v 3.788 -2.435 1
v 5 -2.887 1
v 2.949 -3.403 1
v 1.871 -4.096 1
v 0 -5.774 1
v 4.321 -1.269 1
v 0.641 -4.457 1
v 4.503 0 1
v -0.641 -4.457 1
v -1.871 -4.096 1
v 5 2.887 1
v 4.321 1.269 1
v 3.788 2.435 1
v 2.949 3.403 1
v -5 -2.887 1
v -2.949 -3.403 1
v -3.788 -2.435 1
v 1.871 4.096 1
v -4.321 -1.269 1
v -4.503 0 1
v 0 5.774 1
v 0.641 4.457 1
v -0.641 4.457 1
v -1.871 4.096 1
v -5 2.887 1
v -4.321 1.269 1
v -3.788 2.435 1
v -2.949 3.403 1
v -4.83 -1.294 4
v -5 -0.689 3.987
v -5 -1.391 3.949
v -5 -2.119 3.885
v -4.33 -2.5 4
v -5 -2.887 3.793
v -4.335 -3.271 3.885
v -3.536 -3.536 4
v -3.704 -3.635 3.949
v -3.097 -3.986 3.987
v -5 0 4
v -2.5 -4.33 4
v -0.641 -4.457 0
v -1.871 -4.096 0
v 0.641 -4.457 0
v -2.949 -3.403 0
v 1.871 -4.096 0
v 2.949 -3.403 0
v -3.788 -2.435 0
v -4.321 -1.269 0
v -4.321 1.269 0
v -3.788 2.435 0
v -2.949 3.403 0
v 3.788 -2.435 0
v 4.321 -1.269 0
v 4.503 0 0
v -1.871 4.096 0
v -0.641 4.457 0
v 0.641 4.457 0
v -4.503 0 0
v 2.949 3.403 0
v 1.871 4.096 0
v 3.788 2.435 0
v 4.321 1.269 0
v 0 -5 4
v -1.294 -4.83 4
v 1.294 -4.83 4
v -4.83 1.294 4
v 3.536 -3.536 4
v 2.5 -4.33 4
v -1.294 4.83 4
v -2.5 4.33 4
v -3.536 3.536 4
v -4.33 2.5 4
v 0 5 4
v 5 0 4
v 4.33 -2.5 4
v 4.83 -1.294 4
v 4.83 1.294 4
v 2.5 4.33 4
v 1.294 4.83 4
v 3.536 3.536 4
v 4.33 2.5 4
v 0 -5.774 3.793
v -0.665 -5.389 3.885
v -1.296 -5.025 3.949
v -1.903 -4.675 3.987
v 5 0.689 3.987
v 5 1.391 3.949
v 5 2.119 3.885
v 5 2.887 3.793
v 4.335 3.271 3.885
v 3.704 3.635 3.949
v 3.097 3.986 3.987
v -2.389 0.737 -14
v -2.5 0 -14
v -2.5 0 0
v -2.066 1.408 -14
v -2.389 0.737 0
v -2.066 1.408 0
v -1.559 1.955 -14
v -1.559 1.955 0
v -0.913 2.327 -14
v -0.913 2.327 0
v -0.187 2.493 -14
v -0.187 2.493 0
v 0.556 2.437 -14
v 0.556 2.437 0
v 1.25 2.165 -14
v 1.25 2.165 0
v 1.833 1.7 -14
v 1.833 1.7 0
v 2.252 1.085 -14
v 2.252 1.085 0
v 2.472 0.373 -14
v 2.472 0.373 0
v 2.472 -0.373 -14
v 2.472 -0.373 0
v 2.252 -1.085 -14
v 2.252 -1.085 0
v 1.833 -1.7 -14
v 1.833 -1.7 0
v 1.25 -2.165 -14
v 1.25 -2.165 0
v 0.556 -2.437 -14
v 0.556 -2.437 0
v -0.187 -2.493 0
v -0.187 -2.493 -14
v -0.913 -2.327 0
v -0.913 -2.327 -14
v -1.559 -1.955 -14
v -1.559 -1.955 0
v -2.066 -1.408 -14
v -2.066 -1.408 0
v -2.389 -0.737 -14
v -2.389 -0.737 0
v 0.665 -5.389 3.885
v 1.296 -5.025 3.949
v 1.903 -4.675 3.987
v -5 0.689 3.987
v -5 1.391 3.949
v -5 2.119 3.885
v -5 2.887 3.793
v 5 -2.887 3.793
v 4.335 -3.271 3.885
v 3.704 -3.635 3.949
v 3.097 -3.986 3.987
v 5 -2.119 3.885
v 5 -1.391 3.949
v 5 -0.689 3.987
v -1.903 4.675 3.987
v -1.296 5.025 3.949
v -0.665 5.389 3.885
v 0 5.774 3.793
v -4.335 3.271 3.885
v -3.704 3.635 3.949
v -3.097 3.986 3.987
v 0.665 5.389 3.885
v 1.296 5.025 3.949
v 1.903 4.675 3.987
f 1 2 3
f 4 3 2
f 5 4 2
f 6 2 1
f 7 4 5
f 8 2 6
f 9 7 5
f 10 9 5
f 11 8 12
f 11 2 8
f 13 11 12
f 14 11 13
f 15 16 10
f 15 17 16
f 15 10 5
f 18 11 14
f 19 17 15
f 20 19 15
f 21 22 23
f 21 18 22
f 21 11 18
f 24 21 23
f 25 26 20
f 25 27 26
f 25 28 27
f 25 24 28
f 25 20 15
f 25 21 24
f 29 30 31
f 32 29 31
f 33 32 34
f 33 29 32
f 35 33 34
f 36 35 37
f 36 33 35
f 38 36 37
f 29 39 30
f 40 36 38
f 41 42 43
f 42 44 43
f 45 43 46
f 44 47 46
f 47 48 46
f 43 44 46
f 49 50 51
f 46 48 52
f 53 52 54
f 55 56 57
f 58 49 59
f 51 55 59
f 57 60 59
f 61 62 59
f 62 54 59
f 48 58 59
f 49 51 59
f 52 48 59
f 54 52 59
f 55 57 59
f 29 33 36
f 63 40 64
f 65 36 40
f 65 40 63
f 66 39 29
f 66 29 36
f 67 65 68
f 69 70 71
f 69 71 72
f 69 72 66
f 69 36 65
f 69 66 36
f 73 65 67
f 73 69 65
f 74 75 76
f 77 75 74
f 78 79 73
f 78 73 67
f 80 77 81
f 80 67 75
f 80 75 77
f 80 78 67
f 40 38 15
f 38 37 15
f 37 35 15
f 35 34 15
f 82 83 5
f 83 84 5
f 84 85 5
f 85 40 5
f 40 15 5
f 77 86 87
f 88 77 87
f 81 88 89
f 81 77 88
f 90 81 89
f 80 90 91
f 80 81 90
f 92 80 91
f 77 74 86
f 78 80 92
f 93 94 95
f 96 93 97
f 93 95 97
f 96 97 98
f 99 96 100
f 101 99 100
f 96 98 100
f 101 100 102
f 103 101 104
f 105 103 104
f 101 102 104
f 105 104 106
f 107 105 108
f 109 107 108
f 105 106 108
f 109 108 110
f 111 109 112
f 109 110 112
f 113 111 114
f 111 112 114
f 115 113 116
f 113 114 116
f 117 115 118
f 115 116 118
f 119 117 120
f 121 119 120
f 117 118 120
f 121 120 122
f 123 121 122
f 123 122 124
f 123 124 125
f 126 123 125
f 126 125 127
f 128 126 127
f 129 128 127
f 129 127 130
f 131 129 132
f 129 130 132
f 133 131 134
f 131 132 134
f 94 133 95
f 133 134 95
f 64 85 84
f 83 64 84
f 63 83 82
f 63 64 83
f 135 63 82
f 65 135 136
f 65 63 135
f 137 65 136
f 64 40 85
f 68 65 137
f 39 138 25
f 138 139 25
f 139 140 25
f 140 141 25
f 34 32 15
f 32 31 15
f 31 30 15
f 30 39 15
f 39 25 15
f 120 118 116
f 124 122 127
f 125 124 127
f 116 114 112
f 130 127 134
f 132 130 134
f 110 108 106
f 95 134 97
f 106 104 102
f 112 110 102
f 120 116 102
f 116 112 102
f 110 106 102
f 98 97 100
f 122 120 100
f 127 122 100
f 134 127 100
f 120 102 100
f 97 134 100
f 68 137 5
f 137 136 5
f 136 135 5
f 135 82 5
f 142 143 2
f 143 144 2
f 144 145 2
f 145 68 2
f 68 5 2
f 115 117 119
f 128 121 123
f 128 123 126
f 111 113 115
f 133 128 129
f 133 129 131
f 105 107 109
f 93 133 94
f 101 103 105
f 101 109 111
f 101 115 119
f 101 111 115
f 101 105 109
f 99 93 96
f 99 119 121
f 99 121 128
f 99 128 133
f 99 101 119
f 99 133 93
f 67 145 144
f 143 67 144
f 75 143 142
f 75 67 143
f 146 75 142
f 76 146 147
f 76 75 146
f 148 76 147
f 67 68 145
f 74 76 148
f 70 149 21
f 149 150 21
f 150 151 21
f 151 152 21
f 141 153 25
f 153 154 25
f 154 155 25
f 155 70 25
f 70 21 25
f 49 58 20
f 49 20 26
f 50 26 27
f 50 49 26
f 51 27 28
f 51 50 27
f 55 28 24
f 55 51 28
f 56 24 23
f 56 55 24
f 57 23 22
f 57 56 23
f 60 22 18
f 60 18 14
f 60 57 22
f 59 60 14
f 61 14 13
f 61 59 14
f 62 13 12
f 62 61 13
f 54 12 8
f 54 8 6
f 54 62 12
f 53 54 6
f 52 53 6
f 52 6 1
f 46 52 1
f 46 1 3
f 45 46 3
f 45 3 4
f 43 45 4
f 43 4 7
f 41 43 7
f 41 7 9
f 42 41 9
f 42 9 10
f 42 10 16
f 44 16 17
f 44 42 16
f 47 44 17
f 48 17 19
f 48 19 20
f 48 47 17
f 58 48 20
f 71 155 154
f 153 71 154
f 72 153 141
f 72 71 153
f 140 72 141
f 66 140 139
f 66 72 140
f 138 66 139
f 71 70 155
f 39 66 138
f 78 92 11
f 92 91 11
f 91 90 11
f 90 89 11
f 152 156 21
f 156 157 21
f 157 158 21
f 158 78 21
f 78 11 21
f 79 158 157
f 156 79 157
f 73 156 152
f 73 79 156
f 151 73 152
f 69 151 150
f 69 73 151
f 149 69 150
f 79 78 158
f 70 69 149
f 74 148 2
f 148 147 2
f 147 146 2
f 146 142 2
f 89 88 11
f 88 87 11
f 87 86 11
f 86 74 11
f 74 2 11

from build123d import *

# Parameters (mm, degrees)
RESSALTO_EXTRUS_O3_DEPTH = 4
ESBO_O5_OUTSIDE_W        = 112.192
ESBO_O5_OUTSIDE_H        = 113.74
ESBO_O5_OUTSIDE_R        = 5.562980719
CORTE_EXTRUS_O4_DEPTH    = 13
CORTE_EXTRUS_O4_DRAFT    = -75
ESBO_O6_OUTSIDE_W        = 112.192
ESBO_O6_OUTSIDE_H        = 113.74
ESBO_O6_OUTSIDE_R        = 5.467270474
CORTE_EXTRUS_O5_DEPTH    = 13
CORTE_EXTRUS_O5_DRAFT    = -75
ESBO_O7_R                = 2.5
RESSALTO_EXTRUS_O4_DEPTH = 14
ESBO_O8_OUTSIDE_W        = 128.684
ESBO_O8_OUTSIDE_H        = 130.232
ESBO_O8_OUTSIDE_R        = 5
CORTE_EXTRUS_O6_DEPTH    = 15
CORTE_EXTRUS_O6_DRAFT    = -75
ESBO_O9_OUTSIDE_W        = 16.722
ESBO_O9_OUTSIDE_H        = 18.27
ESBO_O9_OUTSIDE_R        = 4.503145179
CORTE_EXTRUS_O7_DEPTH    = 1


with BuildPart() as part:
    # Esboço1 → Ressalto-extrusão3 (new body)
    with BuildSketch(Plane.XY):
        Polygon((0, 5.773502692), (-5, 2.886751346), (-5, -2.886751346), (0, -5.773502692), (5, -2.886751346), (5, 2.886751346), align=None)
    extrude(amount=RESSALTO_EXTRUS_O3_DEPTH)


with BuildPart() as corte_extrus_o4_tool:
    # Esboço5 outside → Corte-extrusão4 (with draft: the straight prism first)
    with BuildSketch(Plane.XY.offset(4)):
        Rectangle(ESBO_O5_OUTSIDE_W, ESBO_O5_OUTSIDE_H)
        with Locations((-0.125961439, 0)):
            Circle(ESBO_O5_OUTSIDE_R, mode=Mode.SUBTRACT)
    extrude(amount=-CORTE_EXTRUS_O4_DEPTH)
    # Corte-extrusão4: the draft: its side faces are tilted about the plane it starts from
    corte_extrus_o4_sides = [corte_extrus_o4_tool.faces().sort_by_distance(p)[0] for p in [
        (0, -56.87, -2.5),
        (56.096, 0, -2.5),
        (0, 56.87, -2.5),
        (-56.096, 0, -2.5),
        (-5.688942158, 0, -2.5),
    ]]
    draft(corte_extrus_o4_sides, Plane.XY.offset(4), CORTE_EXTRUS_O4_DRAFT)


with BuildPart() as part_1:
    add(part.part)

    # Corte-extrusão4: cut by corte_extrus_o4_tool
    add(corte_extrus_o4_tool.part, mode=Mode.SUBTRACT)


with BuildPart() as corte_extrus_o5_tool:
    # Esboço6 outside → Corte-extrusão5 (with draft: the straight prism first)
    with BuildSketch(Plane(origin=(0, 0, 0), x_dir=(-1, 0, 0), z_dir=(0, 0, -1))):
        Rectangle(ESBO_O6_OUTSIDE_W, ESBO_O6_OUTSIDE_H)
        Circle(ESBO_O6_OUTSIDE_R, mode=Mode.SUBTRACT)
    extrude(amount=-CORTE_EXTRUS_O5_DEPTH)
    # Corte-extrusão5: the draft: its side faces are tilted about the plane it starts from
    corte_extrus_o5_sides = [corte_extrus_o5_tool.faces().sort_by_distance(p)[0] for p in [
        (0, -56.87, 6.5),
        (-56.096, 0, 6.5),
        (0, 56.87, 6.5),
        (56.096, 0, 6.5),
        (5.467270474, 0, 6.5),
    ]]
    draft(corte_extrus_o5_sides, Plane(origin=(0, 0, 0), x_dir=(-1, 0, 0), z_dir=(0, 0, -1)), CORTE_EXTRUS_O5_DRAFT)


with BuildPart() as part_2:
    add(part_1.part)

    # Corte-extrusão5: cut by corte_extrus_o5_tool
    add(corte_extrus_o5_tool.part, mode=Mode.SUBTRACT)


with BuildPart() as body_2:
    # Esboço7 → Ressalto-extrusão4 (new body)
    with BuildSketch(Plane(origin=(0, 0, 0), x_dir=(-1, 0, 0), z_dir=(0, 0, -1))):
        Circle(ESBO_O7_R)
    extrude(amount=RESSALTO_EXTRUS_O4_DEPTH)


with BuildPart() as corte_extrus_o6_tool:
    # Esboço8 outside → Corte-extrusão6 (with draft: the straight prism first)
    with BuildSketch(Plane.XY.offset(4)):
        Rectangle(ESBO_O8_OUTSIDE_W, ESBO_O8_OUTSIDE_H)
        Circle(ESBO_O8_OUTSIDE_R, mode=Mode.SUBTRACT)
    extrude(amount=-CORTE_EXTRUS_O6_DEPTH)
    # Corte-extrusão6: the draft: its side faces are tilted about the plane it starts from
    corte_extrus_o6_sides = [corte_extrus_o6_tool.faces().sort_by_distance(p)[0] for p in [
        (0, -65.116, -3.5),
        (64.342, 0, -3.5),
        (0, 65.116, -3.5),
        (-64.342, 0, -3.5),
        (-5, 0, -3.5),
    ]]
    draft(corte_extrus_o6_sides, Plane.XY.offset(4), CORTE_EXTRUS_O6_DRAFT)


with BuildPart() as part_3:
    add(part_2.part)

    # Corte-extrusão6: cut by corte_extrus_o6_tool
    add(corte_extrus_o6_tool.part, mode=Mode.SUBTRACT)

    # Esboço9 outside → Corte-extrusão7 (cut)
    with BuildSketch(Plane(origin=(0, 0, 0), x_dir=(-1, 0, 0), z_dir=(0, 0, -1))):
        Rectangle(ESBO_O9_OUTSIDE_W, ESBO_O9_OUTSIDE_H)
        Circle(ESBO_O9_OUTSIDE_R, mode=Mode.SUBTRACT)
    extrude(amount=-CORTE_EXTRUS_O7_DEPTH, mode=Mode.SUBTRACT)


solid = Compound([body_2.part, part_3.part])
